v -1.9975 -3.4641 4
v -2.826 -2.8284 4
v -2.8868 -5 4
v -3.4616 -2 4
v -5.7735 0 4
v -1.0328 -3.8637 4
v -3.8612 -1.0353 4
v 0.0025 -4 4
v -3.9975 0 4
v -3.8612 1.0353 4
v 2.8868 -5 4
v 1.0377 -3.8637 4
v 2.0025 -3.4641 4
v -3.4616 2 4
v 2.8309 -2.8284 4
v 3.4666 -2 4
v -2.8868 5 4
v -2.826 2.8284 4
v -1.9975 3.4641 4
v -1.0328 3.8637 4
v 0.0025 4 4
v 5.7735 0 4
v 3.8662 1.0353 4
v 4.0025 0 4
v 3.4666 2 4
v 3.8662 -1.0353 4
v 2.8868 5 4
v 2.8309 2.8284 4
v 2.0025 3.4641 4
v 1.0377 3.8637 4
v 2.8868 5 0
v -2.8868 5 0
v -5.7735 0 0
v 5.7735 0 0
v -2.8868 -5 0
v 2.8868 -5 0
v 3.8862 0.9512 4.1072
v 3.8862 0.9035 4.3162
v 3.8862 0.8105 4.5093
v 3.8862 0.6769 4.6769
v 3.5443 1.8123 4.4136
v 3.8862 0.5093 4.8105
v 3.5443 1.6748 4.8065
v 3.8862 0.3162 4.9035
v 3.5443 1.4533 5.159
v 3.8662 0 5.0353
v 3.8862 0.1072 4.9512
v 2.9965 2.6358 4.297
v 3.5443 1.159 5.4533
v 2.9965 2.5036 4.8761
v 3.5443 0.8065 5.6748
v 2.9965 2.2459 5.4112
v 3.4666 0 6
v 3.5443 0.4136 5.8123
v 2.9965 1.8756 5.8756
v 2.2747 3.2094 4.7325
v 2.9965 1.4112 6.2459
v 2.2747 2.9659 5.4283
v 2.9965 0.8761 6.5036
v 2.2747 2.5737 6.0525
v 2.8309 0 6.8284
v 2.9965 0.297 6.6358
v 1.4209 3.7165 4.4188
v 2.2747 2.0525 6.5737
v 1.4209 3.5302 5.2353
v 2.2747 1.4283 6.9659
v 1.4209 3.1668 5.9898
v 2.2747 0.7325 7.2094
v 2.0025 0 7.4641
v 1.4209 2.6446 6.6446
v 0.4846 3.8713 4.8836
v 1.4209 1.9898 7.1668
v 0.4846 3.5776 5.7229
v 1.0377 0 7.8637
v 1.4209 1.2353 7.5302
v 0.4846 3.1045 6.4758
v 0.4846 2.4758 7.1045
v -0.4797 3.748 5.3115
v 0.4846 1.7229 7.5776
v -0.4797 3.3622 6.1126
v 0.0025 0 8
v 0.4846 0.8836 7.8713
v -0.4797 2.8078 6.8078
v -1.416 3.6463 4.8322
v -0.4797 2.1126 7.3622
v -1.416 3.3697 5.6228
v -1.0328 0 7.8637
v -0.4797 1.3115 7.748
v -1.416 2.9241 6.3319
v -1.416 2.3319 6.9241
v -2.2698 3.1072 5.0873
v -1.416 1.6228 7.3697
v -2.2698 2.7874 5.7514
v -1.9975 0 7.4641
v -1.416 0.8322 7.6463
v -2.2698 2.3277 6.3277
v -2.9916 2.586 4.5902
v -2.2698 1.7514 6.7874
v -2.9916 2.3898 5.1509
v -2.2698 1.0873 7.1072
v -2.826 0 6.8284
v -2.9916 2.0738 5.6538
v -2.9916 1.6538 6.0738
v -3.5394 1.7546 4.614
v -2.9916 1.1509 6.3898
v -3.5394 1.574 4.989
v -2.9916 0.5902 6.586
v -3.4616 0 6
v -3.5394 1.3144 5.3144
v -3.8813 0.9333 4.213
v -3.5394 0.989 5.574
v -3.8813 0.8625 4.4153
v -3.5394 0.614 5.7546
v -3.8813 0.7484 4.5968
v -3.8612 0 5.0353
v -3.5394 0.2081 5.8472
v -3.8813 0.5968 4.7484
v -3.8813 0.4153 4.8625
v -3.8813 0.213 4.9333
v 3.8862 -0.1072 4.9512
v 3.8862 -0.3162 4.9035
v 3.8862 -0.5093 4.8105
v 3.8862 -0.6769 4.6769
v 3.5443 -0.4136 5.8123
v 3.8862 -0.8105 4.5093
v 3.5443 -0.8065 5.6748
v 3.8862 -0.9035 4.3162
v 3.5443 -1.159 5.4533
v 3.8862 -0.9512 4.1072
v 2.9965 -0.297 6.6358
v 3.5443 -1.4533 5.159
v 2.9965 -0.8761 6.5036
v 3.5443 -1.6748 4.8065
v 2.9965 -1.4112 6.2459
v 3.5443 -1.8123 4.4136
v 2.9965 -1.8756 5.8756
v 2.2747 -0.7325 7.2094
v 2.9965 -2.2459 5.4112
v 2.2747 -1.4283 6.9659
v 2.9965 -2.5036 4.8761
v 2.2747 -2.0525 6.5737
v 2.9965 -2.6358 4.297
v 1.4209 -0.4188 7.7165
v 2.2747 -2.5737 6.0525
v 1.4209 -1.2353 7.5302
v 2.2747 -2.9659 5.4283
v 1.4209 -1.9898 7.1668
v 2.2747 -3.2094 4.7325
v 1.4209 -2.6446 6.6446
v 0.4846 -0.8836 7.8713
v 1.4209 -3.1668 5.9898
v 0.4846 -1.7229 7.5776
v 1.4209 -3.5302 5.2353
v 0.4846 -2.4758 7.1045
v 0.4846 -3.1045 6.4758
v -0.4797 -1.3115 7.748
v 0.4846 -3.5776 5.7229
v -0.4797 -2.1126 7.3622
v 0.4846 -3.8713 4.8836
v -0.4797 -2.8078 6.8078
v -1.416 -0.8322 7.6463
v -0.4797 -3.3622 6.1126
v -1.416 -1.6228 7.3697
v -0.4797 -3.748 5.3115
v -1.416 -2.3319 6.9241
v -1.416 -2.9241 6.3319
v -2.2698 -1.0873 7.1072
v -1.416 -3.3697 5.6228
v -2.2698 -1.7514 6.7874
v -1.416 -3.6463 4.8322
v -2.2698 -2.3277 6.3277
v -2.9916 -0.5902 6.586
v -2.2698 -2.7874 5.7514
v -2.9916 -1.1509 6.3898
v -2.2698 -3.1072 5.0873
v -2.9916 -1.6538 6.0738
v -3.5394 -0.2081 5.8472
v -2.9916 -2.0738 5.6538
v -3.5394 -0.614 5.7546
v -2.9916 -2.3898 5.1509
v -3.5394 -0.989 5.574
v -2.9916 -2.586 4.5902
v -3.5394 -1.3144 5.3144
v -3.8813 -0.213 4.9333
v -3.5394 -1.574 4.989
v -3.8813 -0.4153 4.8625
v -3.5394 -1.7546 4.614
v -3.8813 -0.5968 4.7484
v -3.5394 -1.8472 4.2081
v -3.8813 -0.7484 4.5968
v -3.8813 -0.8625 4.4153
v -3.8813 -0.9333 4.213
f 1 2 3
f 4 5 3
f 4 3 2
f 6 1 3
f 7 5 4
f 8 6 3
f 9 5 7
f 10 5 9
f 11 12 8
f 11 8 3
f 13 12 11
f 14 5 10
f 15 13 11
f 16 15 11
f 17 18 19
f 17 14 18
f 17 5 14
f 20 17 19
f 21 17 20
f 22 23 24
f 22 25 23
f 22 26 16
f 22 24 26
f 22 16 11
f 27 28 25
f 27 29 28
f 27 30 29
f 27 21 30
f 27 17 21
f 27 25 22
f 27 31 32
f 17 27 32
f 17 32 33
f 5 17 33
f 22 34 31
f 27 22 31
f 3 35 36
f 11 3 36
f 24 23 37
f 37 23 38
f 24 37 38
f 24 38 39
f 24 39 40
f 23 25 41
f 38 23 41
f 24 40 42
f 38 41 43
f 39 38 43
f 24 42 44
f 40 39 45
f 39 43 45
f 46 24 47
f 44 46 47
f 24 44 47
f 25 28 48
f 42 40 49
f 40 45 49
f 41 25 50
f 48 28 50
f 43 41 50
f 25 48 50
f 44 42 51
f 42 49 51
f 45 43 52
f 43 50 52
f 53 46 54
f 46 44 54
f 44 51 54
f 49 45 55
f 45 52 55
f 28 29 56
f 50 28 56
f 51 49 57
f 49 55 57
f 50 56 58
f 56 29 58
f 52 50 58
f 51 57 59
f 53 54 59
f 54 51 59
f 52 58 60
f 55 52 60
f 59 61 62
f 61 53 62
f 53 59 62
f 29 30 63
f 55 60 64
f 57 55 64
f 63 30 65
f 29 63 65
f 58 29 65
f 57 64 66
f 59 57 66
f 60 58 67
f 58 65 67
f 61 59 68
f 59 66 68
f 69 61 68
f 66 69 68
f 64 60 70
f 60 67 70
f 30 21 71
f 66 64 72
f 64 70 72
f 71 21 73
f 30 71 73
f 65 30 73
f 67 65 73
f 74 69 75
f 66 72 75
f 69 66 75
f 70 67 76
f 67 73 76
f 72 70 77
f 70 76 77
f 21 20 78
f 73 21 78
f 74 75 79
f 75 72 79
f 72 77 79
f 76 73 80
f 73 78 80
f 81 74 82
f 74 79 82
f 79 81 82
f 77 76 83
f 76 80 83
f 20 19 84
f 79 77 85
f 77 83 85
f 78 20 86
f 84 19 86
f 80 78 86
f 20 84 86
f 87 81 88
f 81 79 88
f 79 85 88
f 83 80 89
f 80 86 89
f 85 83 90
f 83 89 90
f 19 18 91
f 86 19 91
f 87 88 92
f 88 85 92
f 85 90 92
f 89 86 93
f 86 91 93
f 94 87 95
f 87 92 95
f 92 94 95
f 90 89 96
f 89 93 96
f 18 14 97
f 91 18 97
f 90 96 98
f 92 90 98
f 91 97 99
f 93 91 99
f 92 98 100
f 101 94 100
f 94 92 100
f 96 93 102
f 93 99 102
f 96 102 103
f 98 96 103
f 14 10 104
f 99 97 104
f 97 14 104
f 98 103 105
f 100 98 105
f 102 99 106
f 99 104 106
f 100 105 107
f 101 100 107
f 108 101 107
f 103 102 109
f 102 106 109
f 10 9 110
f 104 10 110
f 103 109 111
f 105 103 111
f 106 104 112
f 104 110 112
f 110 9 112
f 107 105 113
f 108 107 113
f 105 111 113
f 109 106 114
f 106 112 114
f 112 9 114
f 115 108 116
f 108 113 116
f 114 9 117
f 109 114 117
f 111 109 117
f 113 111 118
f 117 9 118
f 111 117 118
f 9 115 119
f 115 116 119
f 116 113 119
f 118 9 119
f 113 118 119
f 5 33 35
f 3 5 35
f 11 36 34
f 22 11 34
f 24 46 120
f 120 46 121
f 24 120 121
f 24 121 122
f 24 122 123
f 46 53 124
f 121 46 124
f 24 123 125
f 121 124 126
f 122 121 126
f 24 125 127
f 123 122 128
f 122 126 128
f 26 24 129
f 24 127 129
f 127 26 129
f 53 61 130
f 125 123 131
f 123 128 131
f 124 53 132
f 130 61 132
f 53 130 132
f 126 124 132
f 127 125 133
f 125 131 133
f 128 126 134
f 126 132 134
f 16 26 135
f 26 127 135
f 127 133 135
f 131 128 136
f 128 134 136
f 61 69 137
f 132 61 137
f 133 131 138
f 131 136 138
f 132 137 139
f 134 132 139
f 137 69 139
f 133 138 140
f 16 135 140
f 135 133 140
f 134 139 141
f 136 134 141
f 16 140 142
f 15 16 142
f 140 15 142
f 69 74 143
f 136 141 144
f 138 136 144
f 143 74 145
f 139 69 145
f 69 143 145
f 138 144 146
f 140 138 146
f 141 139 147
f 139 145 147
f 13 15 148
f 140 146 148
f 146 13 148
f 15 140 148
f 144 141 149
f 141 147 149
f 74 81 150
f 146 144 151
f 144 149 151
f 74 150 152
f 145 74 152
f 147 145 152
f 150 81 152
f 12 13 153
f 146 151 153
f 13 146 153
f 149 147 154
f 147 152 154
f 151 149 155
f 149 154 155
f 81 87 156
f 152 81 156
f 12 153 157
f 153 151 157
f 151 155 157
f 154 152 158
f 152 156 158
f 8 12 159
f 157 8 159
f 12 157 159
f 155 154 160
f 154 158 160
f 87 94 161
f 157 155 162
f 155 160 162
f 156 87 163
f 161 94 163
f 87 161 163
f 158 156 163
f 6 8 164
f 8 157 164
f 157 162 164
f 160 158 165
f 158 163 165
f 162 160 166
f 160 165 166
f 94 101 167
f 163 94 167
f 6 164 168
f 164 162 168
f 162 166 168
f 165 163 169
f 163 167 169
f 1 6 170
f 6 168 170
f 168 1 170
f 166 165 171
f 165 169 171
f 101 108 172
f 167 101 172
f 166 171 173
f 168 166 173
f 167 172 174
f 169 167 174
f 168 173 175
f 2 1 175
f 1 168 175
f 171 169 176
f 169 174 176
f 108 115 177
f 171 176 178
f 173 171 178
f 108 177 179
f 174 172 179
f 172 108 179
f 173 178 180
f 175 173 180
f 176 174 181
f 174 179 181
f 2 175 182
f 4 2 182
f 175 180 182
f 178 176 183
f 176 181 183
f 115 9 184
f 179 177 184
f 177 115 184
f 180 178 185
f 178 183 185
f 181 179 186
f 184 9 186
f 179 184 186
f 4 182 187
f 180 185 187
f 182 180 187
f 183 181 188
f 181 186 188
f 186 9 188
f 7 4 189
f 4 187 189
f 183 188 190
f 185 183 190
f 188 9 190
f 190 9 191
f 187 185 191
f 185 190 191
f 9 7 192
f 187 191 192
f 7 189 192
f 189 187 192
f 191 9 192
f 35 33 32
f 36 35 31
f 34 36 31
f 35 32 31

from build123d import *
from build123d import SkipClean  # not in build123d's __all__

# Parameters (mm, degrees)
F1_DEPTH = 4


with BuildPart() as f1:
    # F0 (on Top) → F1 (new body)
    with BuildSketch(Plane.XY):
        Polygon((2.8867513459, 5), (-2.8867513459, 5), (-5.7735026919, 0), (-2.8867513459, -5), (2.8867513459, -5), (5.7735026919, 0), align=None)
    extrude(amount=F1_DEPTH)

    # F2 (on Front) → F3 (revolve)
    with BuildSketch(Plane.XZ):
        with BuildLine():
            Line((-3.9975453725, 4), (4.0024546275, 4))
            ThreePointArc((4.0024546275, 4), (0.0024546275, 8), (-3.9975453725, 4))
        make_face()
    with SkipClean():  # cleaning this boolean's faces spoils the solid; the shape is the same uncleaned
        revolve(axis=Axis((0.0024546275, 0, 4), (1, 0, 0)))


solid = f1.part
